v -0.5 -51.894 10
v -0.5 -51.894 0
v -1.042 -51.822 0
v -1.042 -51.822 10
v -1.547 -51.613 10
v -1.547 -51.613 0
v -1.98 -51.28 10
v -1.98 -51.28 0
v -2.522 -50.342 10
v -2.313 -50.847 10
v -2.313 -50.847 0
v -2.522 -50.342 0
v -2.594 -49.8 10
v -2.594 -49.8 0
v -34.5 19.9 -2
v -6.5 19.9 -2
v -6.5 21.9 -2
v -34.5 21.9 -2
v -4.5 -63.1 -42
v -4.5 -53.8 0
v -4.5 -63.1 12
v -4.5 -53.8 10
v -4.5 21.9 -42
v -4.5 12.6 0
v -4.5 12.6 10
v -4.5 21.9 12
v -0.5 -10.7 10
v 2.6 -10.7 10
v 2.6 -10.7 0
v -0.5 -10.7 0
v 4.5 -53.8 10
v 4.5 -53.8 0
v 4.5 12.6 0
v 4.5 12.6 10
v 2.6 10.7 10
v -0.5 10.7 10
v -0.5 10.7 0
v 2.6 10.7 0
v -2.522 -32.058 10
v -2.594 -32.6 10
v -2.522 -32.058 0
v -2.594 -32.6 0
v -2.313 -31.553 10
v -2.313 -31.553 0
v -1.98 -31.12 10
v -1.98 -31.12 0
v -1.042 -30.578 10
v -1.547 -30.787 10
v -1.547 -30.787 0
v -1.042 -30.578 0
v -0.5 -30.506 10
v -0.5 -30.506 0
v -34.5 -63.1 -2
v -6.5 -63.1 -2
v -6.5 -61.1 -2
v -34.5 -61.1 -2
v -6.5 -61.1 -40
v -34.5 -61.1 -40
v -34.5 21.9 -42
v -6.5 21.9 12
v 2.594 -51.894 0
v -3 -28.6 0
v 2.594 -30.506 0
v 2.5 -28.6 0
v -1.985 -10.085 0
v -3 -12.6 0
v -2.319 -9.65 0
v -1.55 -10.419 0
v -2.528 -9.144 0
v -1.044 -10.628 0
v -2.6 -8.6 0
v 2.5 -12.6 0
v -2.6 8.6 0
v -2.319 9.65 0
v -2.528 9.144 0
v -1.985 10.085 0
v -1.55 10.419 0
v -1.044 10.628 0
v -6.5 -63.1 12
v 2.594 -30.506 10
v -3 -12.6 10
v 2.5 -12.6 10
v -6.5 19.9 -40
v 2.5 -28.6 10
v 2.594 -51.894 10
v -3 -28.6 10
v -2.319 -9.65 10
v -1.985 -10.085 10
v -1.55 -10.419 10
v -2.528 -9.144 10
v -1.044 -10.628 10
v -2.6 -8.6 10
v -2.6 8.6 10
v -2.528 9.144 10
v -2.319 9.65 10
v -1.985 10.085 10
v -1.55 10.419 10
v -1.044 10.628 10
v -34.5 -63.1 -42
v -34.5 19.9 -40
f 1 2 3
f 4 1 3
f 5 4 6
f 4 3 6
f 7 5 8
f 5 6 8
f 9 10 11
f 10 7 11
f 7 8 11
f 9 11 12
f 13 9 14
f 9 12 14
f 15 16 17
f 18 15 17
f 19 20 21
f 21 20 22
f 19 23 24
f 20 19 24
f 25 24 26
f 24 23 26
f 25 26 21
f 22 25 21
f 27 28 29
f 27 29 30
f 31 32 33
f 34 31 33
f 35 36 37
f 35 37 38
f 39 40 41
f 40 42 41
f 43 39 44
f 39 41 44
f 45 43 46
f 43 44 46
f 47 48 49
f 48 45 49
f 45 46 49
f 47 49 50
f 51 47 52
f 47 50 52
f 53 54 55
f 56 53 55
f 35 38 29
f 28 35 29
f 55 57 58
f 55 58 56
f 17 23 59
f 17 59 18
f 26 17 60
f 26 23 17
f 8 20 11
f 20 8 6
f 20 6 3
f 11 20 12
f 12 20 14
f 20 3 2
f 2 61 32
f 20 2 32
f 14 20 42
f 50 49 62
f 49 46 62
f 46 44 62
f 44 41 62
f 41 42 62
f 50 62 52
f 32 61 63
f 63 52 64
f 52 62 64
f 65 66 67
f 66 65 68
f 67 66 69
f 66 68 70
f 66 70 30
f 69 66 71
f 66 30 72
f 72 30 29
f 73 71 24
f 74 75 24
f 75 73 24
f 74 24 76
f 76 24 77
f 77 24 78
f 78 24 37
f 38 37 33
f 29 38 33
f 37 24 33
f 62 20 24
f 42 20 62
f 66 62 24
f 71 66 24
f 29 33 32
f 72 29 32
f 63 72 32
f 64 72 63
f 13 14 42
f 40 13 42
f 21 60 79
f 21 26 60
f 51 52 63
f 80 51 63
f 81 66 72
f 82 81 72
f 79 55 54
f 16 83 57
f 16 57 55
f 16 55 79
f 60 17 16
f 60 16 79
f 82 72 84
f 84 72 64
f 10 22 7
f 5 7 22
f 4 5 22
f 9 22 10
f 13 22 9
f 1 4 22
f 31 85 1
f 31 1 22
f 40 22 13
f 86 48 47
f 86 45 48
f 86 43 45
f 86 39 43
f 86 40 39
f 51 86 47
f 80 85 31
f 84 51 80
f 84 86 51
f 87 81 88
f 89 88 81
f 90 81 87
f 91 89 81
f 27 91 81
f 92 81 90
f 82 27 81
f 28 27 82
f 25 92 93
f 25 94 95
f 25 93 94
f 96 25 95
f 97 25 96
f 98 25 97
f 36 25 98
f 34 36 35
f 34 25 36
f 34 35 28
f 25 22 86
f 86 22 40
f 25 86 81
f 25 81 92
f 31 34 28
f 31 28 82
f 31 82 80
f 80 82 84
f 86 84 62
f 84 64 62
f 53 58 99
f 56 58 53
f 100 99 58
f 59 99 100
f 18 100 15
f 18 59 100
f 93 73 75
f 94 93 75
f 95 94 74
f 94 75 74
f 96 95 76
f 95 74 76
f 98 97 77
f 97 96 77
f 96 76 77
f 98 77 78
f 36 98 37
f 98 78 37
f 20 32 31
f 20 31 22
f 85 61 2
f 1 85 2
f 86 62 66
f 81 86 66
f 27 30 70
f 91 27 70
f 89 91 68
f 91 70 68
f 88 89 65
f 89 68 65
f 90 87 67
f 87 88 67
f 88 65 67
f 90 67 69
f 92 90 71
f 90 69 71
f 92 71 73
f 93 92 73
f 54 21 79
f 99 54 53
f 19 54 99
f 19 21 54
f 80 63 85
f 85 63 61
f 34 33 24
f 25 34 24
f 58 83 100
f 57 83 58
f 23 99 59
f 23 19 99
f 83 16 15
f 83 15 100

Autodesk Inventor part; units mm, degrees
ref_plane "YZ Plane" through (0, 0, 0) normal (1, 0, 0) x (0, 1, 0)
ref_plane "XZ Plane" through (0, 0, 0) normal (0, 1, 0) x (-1, 0, 0)
ref_plane "XY Plane" through (0, 0, 0) normal (0, 0, 1) x (1, 0, 0)
sketch "Sketch1" plane through (0, 0, 0) normal (0, 0, 1) x (1, 0, 0)
  arc A0 (-0.5, 10.6) -> (-2.5, 8.6) centre (-0.5, 8.6) ccw projected
  line L0 (-2.5, 8.6) -> (-2.5, -8.6) projected
  arc A1 (-2.5, -8.6) -> (-0.5, -10.6) centre (-0.5, -8.6) ccw projected
  line L1 (-0.5, -10.6) -> (2.5, -10.6) projected
  line L2 (2.5, -10.6) -> (2.5, 10.6) projected
  line L3 (2.5, 10.6) -> (-0.5, 10.6) projected
  line L4 (2.5, -51.8) -> (10.3, -51.8) projected
  arc A2 (10.3, -51.8) -> (12.3, -49.8) centre (10.3, -49.8) ccw projected
  line L5 (12.3, -49.8) -> (12.3, -43.8) projected
  arc A3 (14.3, -41.8) -> (12.3, -43.8) centre (14.3, -43.8) ccw projected
  line L6 (14.3, -41.8) -> (33.1, -41.8) projected
  arc A4 (35.1, -43.8) -> (33.1, -41.8) centre (33.1, -43.8) ccw projected
  line L7 (35.1, -43.8) -> (35.1, -49.8) projected
  arc A5 (35.1, -49.8) -> (37.1, -51.8) centre (37.1, -49.8) ccw projected
  line L8 (37.1, -51.8) -> (47.9, -51.8) projected
  arc A6 (47.9, -51.8) -> (49.9, -49.8) centre (47.9, -49.8) ccw projected
  line L9 (49.9, -49.8) -> (49.9, -27.6) projected
  arc A7 (51.9, -25.6) -> (49.9, -27.6) centre (51.9, -27.6) ccw projected
  line L10 (51.9, -25.6) -> (137.9, -25.6) projected
  arc A8 (139.9, -27.6) -> (137.9, -25.6) centre (137.9, -27.6) ccw projected
  line L11 (139.9, -27.6) -> (139.9, -49.8) projected
  arc A9 (139.9, -49.8) -> (141.9, -51.8) centre (141.9, -49.8) ccw projected
  line L12 (141.9, -51.8) -> (154.1, -51.8) projected
  arc A10 (154.1, -51.8) -> (156.1, -49.8) centre (154.1, -49.8) ccw projected
  line L13 (156.1, -49.8) -> (156.1, -41.8) projected
  line L14 (156.1, -41.8) -> (176.1, -41.8) projected
  line L15 (176.1, -41.8) -> (176.1, -49.8) projected
  arc A11 (176.1, -49.8) -> (178.1, -51.8) centre (178.1, -49.8) ccw projected
  line L16 (178.1, -51.8) -> (190.3, -51.8) projected
  arc A12 (190.3, -51.8) -> (192.3, -49.8) centre (190.3, -49.8) ccw projected
  line L17 (192.3, -49.8) -> (192.3, -38.8) projected
  arc A13 (192.3, -38.8) -> (190.3, -36.8) centre (190.3, -38.8) ccw projected
  line L18 (190.3, -36.8) -> (189.3, -36.8) projected
  arc A14 (187.3, -34.8) -> (189.3, -36.8) centre (189.3, -34.8) ccw projected
  line L19 (187.3, -34.8) -> (187.3, -6.4) projected
  arc A15 (189.3, -4.4) -> (187.3, -6.4) centre (189.3, -6.4) ccw projected
  line L20 (189.3, -4.4) -> (190.3, -4.4) projected
  arc A16 (190.3, -4.4) -> (192.3, -2.4) centre (190.3, -2.4) ccw projected
  line L21 (192.3, -2.4) -> (192.3, 8.6) projected
  arc A17 (192.3, 8.6) -> (190.3, 10.6) centre (190.3, 8.6) ccw projected
  line L22 (190.3, 10.6) -> (178.1, 10.6) projected
  arc A18 (178.1, 10.6) -> (176.1, 8.6) centre (178.1, 8.6) ccw projected
  line L23 (176.1, 8.6) -> (176.1, 2.6) projected
  arc A19 (174.1, 0.6) -> (176.1, 2.6) centre (174.1, 2.6) ccw projected
  line L24 (174.1, 0.6) -> (158.1, 0.6) projected
  arc A20 (156.1, 2.6) -> (158.1, 0.6) centre (158.1, 2.6) ccw projected
  line L25 (156.1, 2.6) -> (156.1, 8.6) projected
  arc A21 (156.1, 8.6) -> (154.1, 10.6) centre (154.1, 8.6) ccw projected
  line L26 (154.1, 10.6) -> (141.9, 10.6) projected
  arc A22 (141.9, 10.6) -> (139.9, 8.6) centre (141.9, 8.6) ccw projected
  line L27 (139.9, 8.6) -> (139.9, -13.6) projected
  arc A23 (137.9, -15.6) -> (139.9, -13.6) centre (137.9, -13.6) ccw projected
  line L28 (51.9, -15.6) -> (137.9, -15.6) projected
  arc A24 (49.9, -13.6) -> (51.9, -15.6) centre (51.9, -13.6) ccw projected
  line L29 (49.9, -13.6) -> (49.9, 8.6) projected
  arc A25 (49.9, 8.6) -> (47.9, 10.6) centre (47.9, 8.6) ccw projected
  line L30 (47.9, 10.6) -> (37.1745, 10.6) projected
  arc A26 (37.1745, 10.6) -> (35.1745, 8.6) centre (37.1745, 8.6) ccw projected
  line L31 (35.1745, 8.6) -> (35.1745, 2.6) projected
  arc A27 (33.1745, 0.6) -> (35.1745, 2.6) centre (33.1745, 2.6) ccw projected
  line L32 (33.1745, 0.6) -> (14.3, 0.6) projected
  arc A28 (12.3, 2.6) -> (14.3, 0.6) centre (14.3, 2.6) ccw projected
  line L33 (12.3, 2.6) -> (12.3, 8.6) projected
  arc A29 (12.3, 8.6) -> (10.3, 10.6) centre (10.3, 8.6) ccw projected
  line L34 (10.3, 10.6) -> (2.5, 10.6) projected
  line L35 (2.5, 10.6) -> (2.5, -51.8) projected
  circle A30 centre (181.65, 5.6) radius 1.25 projected
  circle A31 centre (181.65, -46.8) radius 1.25 projected
  circle A32 centre (150.55, -46.8) radius 1.25 projected
  circle A33 centre (166.1, -20.6) radius 12.5 projected
  circle A34 centre (150.55, 5.6) radius 1.25 projected
  circle A35 centre (39.25, -46.8) radius 1.25 projected
  circle A36 centre (8.15, 5.6) radius 1.25 projected
  circle A37 centre (8.15, -46.8) radius 1.25 projected
  circle A38 centre (23.7, -20.6) radius 12.5 projected
  circle A39 centre (39.25, 5.6) radius 1.25 projected
  arc A40 (-0.5, -30.6) -> (-2.5, -32.6) centre (-0.5, -32.6) ccw projected
  line L36 (-2.5, -32.6) -> (-2.5, -49.8) projected
  arc A41 (-2.5, -49.8) -> (-0.5, -51.8) centre (-0.5, -49.8) ccw projected
  line L37 (-0.5, -51.8) -> (2.5, -51.8) projected
  line L38 (2.5, -51.8) -> (2.5, -30.6) projected
  line L39 (2.5, -30.6) -> (-0.5, -30.6) projected
  arc A42 (-0.5, 12.6) -> (-4.5, 8.6) centre (-0.5, 8.6) ccw
  line L40 (-4.5, 8.6) -> (-4.5, -8.6)
  arc A43 (-4.5, -8.6) -> (-0.5, -12.6) centre (-0.5, -8.6) ccw
  line L41 (-0.5, -12.6) -> (4.5, -12.6)
  line L42 (4.5, -12.6) -> (4.5, 12.6)
  line L43 (4.5, 12.6) -> (-0.5, 12.6)
  arc A44 (-0.5, -28.6) -> (-4.5, -32.6) centre (-0.5, -32.6) ccw
  line L44 (-0.5, -28.6) -> (4.5, -28.6)
  line L45 (4.5, -28.6) -> (4.5, -53.8)
  line L46 (4.5, -53.8) -> (-0.5, -53.8)
  arc A45 (-4.5, -49.8) -> (-0.5, -53.8) centre (-0.5, -49.8) ccw
  line L47 (-4.5, -49.8) -> (-4.5, -32.6)
  line L48 (4.5, -12.6) -> (4.5, -28.6)
  line L49 (-4.5, -8.6) -> (-4.5, -32.6)
  line L50 (0, -28.6) -> (0, -12.6)
  line L51 (-3, -12.6) -> (3, -12.6)
  line L52 (3, -12.6) -> (3, -28.6)
  line L53 (3, -28.6) -> (-3, -28.6)
  line L54 (-3, -28.6) -> (-3, -12.6)
  line L55 (-3, -12.6) -> (3, -28.6) construction
  line L56 (3, -12.6) -> (-3, -28.6) construction
  arc A46 (-0.5, -30.5065) -> (-2.5935, -32.6) centre (-0.5, -32.6) ccw
  line L57 (-0.5, -30.5065) -> (2.5935, -30.5065)
  line L58 (2.5935, -30.5065) -> (2.5935, -51.8935)
  line L59 (2.5935, -51.8935) -> (-0.5, -51.8935)
  arc A47 (-2.5935, -49.8) -> (-0.5, -51.8935) centre (-0.5, -49.8) ccw
  line L60 (-2.5935, -49.8) -> (-2.5935, -32.6)
  arc A48 (-2.6, -8.6) -> (-0.5, -10.7) centre (-0.5, -8.6) ccw
  line L61 (-2.6, -8.6) -> (-2.6, 8.6)
  arc A49 (-0.5, 10.7) -> (-2.6, 8.6) centre (-0.5, 8.6) ccw
  line L62 (-0.5, 10.7) -> (2.6, 10.7)
  line L63 (2.6, 10.7) -> (2.6, -10.7)
  line L64 (2.6, -10.7) -> (-0.5, -10.7)
  line L65 (2.5, -12.6) -> (2.5, -13.431)
  line L66 (2.5, -13.431) -> (2.5, -15.7904)
  line L67 (2.5, -15.7904) -> (2.5, -28.2258)
  line L68 (2.5, -28.2258) -> (2.5, -28.5718)
  line L69 (2.5, -28.5718) -> (2.5, -28.6211)
  line L70 (4.5, 12.6) -> (-4.5, 12.6)
  line L71 (-4.5, 12.6) -> (-4.5, -53.8)
  line L72 (-4.5, -53.8) -> (4.5, -53.8)
  line L73 (4.5, -53.8) -> (4.5, 12.6)
  point P0 (0, 0)
  point P1 (0, -20.6)
  point P2 (2.5, -12.6)
  point P3 (2.5, -28.6)
  point P4 (2.5935, -51.8)
  point P5 (4.5, -51.8)
  point P6 (2.5, -30.5065)
  point P7 (-0.5, -28.6)
  point P8 (-0.5, -12.6)
  point P9 (2.5, -10.7)
  point P10 (4.5, 10.6)
  point P11 (2.6, 10.6)
  point P12 (-4.5, 8.6)
  point P13 (-0.5, 12.6)
  point P14 (-0.5, -53.8)
  point P15 (-4.5, -49.8)
  dimension "d0" = 2
  dimension "d1" = 2
  dimension "d2" = 6
  dimension "d3" = 0.1
extrude "Extrusion1" add sketch "Sketch1" along normal blind 10 contours L63 L62 A49 L61 A48 L64 L35 L41 A43 L40 A42 L43 L42 L34 | L34 L42 L41 L35 L64 L63 | L41 L52 L44 L35 | L48 L44 L52 L41 | L45 L4 L58 L57 L35 L44 | A42 L71 L70 | L51 L54 L53 A44 L49 A43 | L44 L35 L57 A46 L60 A47 L59 L58 L4 L45 L46 A45 L47 A44 | L72 L71 A45
sketch "Sketch10" plane through (-4.5, -53.8, 0) normal (-1, 0, 0) x (0, 0, 1)
  line L0 (0, 66.4) -> (0, 0) projected
  line L1 (0, 0) -> (10, 0) projected
  line L2 (10, 66.4) -> (10, 0) projected
  line L3 (0, 66.4) -> (10, 66.4) projected
  line L4 (0, 1.9065) -> (0, 0)
  line L5 (0, -7.3) -> (10, -7.3)
  line L6 (10, -7.3) -> (10, 73.7)
  line L7 (10, 73.7) -> (0, 73.7)
  line L8 (0, 73.7) -> (10, -7.3) construction
  line L9 (0, -7.3) -> (10, 73.7) construction
  line L10 (0, 1.9065) -> (10, 1.9065) projected
  line L11 (0, 73.7) -> (81, 73.7) construction
  line L12 (12, -9.3) -> (-2, -9.3)
  line L13 (-2, -9.3) -> (-2, 75.7)
  line L14 (-2, 75.7) -> (12, 75.7)
  line L15 (12, 75.7) -> (12, -9.3)
  line L16 (0, 73.7) -> (-40, 73.7)
  line L17 (-40, 73.7) -> (-40, -7.3)
  line L18 (-40, -7.3) -> (0, -7.3)
  line L19 (0, 0) -> (0, 1.9065)
  line L20 (-42, 75.7) -> (2, 75.7)
  line L21 (2, -9.3) -> (-42, -9.3)
  line L22 (-42, -9.3) -> (-42, 75.7)
  line L23 (2, -7.3) -> (2, -9.3)
  line L24 (10, -7.3) -> (10, -9.3)
  line L25 (10, 73.7) -> (10, 75.7)
  point P0 (0, 53.8)
  point P1 (5, 33.2)
  point P2 (-2, -9.3)
  point P3 (-2, 73.7)
  point P4 (-2, -9.3)
  point P5 (-2, -7.3)
  dimension "d64" = 81
  dimension "d65" = 90
  dimension "d66" = 2
  dimension "d67" = 40
  dimension "d68" = 2
extrude "Extrusion9" add sketch "Sketch10" along normal blind 2
extrude "Extrusion10" add sketch "Sketch10" along normal blind 30 contours L16 L17 L18 L13 L21 L22 L20
properties part number "drzalo_vezja"
